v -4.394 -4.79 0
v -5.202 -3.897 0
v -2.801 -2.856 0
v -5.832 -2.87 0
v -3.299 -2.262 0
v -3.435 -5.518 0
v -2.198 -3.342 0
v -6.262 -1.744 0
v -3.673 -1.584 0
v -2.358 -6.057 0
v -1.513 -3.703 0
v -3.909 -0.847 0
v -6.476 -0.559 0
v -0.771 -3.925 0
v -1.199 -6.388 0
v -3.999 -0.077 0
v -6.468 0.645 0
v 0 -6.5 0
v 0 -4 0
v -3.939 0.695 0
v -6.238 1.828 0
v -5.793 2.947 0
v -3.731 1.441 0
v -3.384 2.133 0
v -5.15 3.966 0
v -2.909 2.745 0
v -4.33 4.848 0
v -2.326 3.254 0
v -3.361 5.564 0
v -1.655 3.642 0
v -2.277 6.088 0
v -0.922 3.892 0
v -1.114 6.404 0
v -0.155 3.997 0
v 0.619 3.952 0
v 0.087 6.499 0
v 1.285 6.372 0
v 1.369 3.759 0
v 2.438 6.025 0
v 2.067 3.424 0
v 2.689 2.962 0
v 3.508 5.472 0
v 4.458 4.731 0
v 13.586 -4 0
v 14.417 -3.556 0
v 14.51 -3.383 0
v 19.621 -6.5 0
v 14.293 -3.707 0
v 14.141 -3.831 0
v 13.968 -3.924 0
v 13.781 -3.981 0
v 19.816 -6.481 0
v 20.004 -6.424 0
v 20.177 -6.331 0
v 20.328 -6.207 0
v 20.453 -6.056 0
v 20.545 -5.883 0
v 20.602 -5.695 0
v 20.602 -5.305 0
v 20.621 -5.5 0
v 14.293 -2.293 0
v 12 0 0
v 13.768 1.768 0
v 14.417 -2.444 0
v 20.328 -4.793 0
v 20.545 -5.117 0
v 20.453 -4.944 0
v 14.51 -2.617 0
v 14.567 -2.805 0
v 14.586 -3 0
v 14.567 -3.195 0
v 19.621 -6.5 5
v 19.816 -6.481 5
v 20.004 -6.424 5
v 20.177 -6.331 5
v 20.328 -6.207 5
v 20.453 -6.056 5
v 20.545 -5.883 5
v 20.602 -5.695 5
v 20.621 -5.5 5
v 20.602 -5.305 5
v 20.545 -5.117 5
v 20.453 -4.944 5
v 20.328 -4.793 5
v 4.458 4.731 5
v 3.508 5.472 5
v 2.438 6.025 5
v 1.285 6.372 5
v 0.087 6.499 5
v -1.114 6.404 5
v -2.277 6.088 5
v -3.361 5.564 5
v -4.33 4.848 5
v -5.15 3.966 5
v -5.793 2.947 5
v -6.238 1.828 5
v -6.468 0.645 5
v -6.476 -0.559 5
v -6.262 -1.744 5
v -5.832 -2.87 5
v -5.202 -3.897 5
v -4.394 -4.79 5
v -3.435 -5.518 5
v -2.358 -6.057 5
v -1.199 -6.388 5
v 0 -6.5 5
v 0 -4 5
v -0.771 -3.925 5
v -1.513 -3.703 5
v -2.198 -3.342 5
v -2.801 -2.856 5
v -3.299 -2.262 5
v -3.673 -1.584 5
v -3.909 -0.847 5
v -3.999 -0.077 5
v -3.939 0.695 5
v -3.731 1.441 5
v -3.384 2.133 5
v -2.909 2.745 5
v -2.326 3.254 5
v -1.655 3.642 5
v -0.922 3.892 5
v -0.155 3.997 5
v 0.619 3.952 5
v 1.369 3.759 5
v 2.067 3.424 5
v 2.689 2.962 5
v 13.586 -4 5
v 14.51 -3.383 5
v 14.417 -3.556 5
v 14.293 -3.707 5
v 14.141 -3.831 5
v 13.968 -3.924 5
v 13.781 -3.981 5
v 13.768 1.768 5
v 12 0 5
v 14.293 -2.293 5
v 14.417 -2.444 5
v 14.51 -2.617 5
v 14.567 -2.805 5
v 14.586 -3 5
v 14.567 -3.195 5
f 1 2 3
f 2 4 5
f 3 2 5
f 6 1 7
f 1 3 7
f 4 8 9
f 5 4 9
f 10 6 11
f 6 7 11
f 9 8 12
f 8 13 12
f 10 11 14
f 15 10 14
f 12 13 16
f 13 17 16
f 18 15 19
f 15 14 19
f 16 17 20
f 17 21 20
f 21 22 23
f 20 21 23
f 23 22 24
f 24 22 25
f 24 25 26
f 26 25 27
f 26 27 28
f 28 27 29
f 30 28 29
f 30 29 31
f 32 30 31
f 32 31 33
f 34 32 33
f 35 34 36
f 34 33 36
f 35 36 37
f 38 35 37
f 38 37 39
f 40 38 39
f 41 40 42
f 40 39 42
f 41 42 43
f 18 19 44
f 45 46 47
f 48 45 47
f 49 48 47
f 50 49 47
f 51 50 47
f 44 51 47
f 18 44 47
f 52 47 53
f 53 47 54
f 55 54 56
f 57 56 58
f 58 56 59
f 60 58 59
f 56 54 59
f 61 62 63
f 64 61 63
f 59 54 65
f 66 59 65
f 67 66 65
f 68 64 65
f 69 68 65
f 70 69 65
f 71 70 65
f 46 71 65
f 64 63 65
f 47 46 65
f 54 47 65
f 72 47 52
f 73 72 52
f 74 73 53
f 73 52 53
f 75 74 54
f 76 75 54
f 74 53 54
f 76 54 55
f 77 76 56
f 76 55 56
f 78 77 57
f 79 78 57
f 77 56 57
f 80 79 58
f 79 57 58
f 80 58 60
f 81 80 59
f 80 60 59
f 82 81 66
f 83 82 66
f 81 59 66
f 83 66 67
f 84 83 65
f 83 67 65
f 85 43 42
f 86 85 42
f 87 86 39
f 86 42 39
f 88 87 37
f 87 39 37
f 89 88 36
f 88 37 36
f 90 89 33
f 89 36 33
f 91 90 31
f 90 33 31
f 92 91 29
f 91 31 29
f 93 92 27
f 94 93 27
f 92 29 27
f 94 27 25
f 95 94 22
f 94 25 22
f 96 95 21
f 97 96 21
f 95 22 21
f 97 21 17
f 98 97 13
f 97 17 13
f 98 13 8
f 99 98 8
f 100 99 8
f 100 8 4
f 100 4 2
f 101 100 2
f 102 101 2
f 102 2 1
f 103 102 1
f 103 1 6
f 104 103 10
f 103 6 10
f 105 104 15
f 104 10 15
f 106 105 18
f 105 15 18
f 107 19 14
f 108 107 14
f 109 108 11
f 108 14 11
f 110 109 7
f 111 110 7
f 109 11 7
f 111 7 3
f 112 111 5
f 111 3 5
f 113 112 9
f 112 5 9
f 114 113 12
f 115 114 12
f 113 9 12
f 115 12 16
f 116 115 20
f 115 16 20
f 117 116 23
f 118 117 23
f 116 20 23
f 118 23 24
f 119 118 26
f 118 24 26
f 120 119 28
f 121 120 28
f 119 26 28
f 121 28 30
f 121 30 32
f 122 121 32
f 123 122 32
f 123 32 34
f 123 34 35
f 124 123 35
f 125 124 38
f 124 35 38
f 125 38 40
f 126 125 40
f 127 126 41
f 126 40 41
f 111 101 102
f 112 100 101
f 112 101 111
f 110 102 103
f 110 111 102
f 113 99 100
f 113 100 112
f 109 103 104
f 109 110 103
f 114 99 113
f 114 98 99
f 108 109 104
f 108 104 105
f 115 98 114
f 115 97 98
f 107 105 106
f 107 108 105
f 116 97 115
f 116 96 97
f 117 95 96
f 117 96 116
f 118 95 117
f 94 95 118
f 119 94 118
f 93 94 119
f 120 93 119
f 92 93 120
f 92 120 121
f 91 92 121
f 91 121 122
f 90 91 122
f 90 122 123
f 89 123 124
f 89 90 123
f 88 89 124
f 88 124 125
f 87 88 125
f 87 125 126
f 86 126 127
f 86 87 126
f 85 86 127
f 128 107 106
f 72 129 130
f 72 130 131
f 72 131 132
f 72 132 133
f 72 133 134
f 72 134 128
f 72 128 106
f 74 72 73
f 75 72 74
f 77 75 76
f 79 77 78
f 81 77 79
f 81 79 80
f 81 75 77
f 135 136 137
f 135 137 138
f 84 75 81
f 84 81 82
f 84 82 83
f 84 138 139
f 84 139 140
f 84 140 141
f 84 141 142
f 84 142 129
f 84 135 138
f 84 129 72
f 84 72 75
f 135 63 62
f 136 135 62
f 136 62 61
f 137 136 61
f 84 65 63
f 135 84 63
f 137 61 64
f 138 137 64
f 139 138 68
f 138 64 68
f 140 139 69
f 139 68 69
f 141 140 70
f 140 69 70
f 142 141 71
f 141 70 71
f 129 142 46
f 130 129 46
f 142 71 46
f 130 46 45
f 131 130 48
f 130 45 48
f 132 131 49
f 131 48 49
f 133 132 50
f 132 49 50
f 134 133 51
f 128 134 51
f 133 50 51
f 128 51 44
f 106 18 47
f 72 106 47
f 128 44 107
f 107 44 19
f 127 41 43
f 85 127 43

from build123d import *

# Parameters (mm, degrees)
RESSALTO_EXTRUS_O1_DEPTH = 5


with BuildPart() as part:
    # Esboço1 → Ressalto-extrusão1 (new body)
    with BuildSketch(Plane.XY):
        with BuildLine():
            Line((0, -6.5), (19.621320344, -6.5))
            ThreePointArc((19.621320344, -6.5), (20.545199876, -5.882683432), (20.328427125, -4.792893219))
            Line((20.328427125, -4.792893219), (13.767766953, 1.767766953))
            Line((13.767766953, 1.767766953), (12, 0))
            Line((12, 0), (14.292893219, -2.292893219))
            ThreePointArc((14.292893219, -2.292893219), (14.50966597, -3.382683432), (13.585786438, -4))
            Line((13.585786438, -4), (0, -4))
            ThreePointArc((0, -4), (-3.731407445, 1.441040764), (2.688555117, 2.961700759))
            Line((2.688555117, 2.961700759), (4.457591724, 4.730737366))
            ThreePointArc((4.457591724, 4.730737366), (-6.041514416, 2.397937356), (0, -6.5))
        make_face()
    extrude(amount=RESSALTO_EXTRUS_O1_DEPTH)


solid = part.part
